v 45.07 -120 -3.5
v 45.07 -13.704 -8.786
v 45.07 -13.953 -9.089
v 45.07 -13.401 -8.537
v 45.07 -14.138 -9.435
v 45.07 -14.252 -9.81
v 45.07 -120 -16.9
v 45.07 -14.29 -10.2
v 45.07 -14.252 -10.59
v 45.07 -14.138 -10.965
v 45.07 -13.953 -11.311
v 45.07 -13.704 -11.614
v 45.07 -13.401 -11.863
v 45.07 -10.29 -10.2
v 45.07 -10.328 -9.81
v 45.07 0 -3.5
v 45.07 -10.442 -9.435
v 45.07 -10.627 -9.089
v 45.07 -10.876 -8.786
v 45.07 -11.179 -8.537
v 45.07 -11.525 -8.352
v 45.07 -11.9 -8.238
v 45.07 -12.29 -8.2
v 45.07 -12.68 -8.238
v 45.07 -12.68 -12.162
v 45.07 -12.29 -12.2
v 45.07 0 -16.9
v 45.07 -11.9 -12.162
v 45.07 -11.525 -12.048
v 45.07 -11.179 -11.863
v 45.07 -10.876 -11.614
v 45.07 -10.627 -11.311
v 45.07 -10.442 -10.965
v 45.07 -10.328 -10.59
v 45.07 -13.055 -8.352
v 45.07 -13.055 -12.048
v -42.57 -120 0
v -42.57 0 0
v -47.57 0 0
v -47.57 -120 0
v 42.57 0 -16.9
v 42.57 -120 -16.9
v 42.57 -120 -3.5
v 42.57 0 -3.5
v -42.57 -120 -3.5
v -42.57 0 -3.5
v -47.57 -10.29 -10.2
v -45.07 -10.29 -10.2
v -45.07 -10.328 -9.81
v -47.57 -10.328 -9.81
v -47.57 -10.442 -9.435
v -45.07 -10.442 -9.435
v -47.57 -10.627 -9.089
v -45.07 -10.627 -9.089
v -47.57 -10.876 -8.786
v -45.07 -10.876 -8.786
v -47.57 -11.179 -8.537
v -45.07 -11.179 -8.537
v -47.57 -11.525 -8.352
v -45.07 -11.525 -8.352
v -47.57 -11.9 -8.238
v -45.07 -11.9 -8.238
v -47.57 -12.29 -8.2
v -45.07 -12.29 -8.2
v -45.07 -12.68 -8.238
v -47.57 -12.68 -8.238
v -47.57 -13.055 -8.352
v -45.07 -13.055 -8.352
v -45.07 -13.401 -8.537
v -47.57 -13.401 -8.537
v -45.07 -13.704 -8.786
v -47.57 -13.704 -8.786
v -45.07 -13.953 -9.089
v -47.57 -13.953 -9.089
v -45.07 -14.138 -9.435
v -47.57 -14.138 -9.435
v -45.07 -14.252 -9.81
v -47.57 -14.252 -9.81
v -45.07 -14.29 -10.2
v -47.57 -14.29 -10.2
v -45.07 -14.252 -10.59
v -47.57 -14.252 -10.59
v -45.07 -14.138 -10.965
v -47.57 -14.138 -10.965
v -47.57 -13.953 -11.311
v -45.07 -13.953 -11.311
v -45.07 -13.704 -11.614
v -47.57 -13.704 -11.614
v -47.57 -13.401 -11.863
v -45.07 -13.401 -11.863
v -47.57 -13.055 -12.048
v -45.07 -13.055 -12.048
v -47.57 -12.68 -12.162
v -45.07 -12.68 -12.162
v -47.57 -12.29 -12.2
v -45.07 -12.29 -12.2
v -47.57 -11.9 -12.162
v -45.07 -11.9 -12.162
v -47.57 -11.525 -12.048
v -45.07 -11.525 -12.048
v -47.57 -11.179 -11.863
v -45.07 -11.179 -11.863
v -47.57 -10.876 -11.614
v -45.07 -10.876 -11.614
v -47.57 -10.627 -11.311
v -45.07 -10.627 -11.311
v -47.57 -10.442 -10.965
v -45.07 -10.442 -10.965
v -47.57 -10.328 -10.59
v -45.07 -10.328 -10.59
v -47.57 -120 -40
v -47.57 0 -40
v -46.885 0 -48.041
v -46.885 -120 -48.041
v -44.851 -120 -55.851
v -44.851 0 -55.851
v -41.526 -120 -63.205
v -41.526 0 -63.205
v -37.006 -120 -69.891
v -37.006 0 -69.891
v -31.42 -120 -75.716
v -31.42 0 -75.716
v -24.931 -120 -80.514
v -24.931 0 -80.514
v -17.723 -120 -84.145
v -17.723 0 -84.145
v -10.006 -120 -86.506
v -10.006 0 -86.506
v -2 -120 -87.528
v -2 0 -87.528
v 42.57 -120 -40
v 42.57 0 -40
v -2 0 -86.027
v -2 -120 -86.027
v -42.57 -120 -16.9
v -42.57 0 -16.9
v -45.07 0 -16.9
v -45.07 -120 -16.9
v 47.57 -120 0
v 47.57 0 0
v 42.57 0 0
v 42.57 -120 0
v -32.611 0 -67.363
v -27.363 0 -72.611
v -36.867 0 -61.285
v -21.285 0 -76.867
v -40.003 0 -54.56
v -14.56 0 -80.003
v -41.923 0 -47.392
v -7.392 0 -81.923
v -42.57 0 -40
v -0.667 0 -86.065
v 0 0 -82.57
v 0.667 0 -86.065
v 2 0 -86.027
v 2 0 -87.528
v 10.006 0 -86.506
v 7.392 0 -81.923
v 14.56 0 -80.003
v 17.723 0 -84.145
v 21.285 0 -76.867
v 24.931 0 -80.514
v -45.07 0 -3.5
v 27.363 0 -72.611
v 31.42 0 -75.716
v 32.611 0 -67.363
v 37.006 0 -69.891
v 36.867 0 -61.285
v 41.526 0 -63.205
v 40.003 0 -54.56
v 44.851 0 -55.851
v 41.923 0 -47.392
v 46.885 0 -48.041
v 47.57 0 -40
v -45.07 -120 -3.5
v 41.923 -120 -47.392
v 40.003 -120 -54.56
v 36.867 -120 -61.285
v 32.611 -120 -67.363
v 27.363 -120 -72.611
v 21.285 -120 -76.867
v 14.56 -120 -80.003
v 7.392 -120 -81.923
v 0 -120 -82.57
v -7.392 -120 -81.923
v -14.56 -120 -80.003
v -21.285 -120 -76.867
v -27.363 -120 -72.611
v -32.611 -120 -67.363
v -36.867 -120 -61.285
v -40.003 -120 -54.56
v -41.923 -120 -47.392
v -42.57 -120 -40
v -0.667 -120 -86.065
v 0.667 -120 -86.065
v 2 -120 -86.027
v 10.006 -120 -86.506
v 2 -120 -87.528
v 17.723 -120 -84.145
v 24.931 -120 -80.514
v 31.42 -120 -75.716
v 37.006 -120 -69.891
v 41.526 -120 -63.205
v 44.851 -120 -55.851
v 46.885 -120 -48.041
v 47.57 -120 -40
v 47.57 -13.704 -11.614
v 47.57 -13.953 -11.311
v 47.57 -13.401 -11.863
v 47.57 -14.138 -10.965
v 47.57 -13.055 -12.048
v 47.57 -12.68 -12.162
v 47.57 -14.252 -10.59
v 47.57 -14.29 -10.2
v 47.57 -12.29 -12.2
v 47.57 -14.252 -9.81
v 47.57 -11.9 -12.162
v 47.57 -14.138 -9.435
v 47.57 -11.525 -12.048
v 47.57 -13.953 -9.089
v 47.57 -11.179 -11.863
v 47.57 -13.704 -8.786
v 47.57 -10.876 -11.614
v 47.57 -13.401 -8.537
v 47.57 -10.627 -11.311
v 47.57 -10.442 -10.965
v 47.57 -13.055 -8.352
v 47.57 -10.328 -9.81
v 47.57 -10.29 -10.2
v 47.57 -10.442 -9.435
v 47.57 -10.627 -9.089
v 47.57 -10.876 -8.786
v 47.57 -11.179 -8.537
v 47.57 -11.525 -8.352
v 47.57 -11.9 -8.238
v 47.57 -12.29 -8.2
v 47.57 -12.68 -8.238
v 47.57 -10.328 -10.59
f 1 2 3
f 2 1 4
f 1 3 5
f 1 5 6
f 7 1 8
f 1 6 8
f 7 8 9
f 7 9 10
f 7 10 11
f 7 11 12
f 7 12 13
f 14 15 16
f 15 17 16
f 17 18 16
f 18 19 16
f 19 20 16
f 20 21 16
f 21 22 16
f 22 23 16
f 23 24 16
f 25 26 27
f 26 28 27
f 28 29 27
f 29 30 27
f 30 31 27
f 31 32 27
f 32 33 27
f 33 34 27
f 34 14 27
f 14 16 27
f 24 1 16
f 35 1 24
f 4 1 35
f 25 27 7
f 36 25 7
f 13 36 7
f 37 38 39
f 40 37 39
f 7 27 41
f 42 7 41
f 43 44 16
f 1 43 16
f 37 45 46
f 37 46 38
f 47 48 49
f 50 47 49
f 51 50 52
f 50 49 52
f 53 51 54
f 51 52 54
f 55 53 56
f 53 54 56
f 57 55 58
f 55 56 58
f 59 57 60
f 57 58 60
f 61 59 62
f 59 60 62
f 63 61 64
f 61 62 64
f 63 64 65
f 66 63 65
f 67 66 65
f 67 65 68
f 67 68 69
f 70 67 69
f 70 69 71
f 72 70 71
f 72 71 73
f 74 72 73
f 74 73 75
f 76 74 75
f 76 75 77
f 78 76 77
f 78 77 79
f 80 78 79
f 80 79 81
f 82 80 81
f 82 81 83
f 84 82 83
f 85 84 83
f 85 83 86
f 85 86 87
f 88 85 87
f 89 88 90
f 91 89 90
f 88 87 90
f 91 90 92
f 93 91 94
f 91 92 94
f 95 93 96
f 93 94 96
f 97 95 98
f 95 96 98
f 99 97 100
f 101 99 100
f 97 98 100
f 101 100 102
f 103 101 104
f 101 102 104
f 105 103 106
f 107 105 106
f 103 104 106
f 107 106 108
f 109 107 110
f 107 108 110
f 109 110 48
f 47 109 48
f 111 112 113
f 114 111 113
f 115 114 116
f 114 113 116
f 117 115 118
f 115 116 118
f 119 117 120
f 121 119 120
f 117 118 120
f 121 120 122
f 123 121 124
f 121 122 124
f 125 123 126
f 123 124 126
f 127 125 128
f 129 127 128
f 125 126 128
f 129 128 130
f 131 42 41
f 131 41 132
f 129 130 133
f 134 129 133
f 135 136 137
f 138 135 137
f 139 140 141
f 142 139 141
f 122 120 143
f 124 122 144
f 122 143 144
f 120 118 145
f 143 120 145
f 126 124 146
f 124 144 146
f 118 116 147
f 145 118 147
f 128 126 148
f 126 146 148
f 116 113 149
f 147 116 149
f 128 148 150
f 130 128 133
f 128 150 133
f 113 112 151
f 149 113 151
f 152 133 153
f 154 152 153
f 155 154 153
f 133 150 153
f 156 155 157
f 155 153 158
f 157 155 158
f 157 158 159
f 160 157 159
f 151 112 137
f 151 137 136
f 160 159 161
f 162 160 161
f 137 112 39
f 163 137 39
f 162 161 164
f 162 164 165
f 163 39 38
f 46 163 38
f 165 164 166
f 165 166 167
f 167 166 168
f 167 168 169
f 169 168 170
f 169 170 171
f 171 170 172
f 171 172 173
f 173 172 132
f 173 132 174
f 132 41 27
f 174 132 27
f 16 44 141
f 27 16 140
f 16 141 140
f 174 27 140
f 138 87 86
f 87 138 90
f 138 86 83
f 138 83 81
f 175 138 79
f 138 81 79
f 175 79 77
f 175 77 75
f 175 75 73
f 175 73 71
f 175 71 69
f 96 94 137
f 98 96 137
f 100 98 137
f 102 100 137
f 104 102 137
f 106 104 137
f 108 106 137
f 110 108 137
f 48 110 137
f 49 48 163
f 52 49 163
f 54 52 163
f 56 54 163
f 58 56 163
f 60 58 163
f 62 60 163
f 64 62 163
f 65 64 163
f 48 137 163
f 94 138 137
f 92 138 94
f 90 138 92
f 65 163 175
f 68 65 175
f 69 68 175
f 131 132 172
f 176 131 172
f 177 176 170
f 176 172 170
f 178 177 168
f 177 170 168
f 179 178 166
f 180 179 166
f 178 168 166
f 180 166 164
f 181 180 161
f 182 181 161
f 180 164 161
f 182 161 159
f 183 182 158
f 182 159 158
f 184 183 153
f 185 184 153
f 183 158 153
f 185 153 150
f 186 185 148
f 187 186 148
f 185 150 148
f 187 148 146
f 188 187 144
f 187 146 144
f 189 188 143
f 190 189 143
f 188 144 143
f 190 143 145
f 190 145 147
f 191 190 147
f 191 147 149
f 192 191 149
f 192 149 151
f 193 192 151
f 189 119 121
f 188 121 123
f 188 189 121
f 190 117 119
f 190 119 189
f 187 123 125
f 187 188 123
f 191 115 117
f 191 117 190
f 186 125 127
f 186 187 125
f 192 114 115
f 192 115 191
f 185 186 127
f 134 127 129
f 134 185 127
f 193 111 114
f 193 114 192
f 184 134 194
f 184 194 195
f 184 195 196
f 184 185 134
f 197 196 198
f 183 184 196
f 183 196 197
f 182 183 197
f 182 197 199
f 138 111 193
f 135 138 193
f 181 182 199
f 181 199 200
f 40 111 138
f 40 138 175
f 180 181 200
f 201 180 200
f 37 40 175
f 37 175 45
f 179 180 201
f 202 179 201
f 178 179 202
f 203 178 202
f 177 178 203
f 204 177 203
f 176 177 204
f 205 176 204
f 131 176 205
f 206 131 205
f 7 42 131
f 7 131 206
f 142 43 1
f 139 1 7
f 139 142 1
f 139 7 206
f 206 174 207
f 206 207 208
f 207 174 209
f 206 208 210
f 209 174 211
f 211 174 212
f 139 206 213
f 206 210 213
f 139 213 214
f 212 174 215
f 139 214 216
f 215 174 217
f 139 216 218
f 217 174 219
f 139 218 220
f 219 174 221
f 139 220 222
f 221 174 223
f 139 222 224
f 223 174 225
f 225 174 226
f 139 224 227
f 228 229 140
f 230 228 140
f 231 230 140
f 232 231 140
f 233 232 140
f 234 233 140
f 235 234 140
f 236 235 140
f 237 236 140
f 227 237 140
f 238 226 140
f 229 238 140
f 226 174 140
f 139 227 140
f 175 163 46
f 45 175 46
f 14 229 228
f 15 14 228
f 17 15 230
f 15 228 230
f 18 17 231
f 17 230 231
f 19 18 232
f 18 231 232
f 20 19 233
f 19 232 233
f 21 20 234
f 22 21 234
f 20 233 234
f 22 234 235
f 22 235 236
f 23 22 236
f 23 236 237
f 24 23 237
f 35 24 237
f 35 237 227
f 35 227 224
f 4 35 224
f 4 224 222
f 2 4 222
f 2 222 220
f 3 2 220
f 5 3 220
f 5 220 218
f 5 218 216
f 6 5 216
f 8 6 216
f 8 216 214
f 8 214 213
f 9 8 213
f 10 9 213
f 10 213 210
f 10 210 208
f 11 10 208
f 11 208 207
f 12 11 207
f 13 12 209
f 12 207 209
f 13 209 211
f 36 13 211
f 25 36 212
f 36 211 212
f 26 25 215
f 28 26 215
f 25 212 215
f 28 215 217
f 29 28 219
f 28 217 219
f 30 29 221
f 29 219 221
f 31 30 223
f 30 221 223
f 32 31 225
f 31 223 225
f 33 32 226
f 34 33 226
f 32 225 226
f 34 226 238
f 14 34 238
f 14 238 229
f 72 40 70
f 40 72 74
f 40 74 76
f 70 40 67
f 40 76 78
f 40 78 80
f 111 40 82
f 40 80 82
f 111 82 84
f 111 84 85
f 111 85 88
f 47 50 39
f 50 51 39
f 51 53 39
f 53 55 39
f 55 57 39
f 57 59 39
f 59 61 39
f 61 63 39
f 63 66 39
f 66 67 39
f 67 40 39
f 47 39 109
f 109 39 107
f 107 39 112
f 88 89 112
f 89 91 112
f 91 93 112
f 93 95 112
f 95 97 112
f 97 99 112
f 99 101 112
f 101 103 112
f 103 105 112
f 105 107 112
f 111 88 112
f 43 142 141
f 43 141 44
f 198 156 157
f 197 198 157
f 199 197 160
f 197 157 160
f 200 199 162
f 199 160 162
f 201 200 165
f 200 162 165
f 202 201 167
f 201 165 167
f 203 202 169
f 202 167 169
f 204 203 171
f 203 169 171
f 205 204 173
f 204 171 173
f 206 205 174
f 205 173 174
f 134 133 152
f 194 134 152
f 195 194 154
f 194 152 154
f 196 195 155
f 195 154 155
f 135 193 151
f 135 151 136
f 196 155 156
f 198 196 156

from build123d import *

# Parameters (mm, degrees)
F1_DEPTH = 120
F2_R     = 2
F3_DEPTH = 95.141


# Not quite as in the source:
# - ends of sketch curves that miss each other by under 0.0002 mm in the source are joined


with BuildPart() as f1:
    # F0 (on Front) → F1 (new body)
    with BuildSketch(Plane.XZ):
        with BuildLine():
            Line((-42.5699986517, 0), (-47.569999482, 0))
            Line((-47.569999482, 0), (-47.569999482, -40))
            ThreePointArc((-47.569999482, -40), (-34.336896153, -72.9223698712), (-2, -87.5279378404))
            Line((-2, -87.5279378404), (-2, -86.0265670688))
            ThreePointArc((-2, -86.0265670688), (0, -86.069999741), (2, -86.0265670688))
            Line((2, -86.0265670688), (2, -87.5279378404))
            ThreePointArc((2, -87.5279378404), (34.336896153, -72.9223698712), (47.569999741, -40))
            Line((47.569999741, -40), (47.570000518, 0))
            Line((47.570000518, 0), (42.570000518, 0))
            Line((42.570000518, 0), (42.570000518, -3.5))
            Line((42.570000518, -3.5), (45.070000518, -3.5))
            Line((45.070000518, -3.5), (45.070000518, -16.9))
            Line((45.070000518, -16.9), (42.570000518, -16.9))
            Line((42.570000518, -16.9), (42.570000518, -40))
            ThreePointArc((42.570000518, -40), (0, -82.5699996948), (-42.5699996948, -40))
            Line((-42.5699996948, -40), (-42.5699986517, -16.9))
            Line((-42.5699986517, -16.9), (-45.070000518, -16.9))
            Line((-45.070000518, -16.9), (-45.070000518, -3.5))
            Line((-45.070000518, -3.5), (-42.5699986517, -3.5))
            Line((-42.5699986517, -3.5), (-42.5699986517, 0))
        make_face()
    extrude(amount=F1_DEPTH)

    # F2 (on face) → F3 (cut, through all)
    with BuildSketch(Plane.YZ.offset(47.570000518)):
        with Locations((-12.29, -10.2)):
            Circle(F2_R)
    extrude(amount=-F3_DEPTH, mode=Mode.SUBTRACT)


solid = f1.part
